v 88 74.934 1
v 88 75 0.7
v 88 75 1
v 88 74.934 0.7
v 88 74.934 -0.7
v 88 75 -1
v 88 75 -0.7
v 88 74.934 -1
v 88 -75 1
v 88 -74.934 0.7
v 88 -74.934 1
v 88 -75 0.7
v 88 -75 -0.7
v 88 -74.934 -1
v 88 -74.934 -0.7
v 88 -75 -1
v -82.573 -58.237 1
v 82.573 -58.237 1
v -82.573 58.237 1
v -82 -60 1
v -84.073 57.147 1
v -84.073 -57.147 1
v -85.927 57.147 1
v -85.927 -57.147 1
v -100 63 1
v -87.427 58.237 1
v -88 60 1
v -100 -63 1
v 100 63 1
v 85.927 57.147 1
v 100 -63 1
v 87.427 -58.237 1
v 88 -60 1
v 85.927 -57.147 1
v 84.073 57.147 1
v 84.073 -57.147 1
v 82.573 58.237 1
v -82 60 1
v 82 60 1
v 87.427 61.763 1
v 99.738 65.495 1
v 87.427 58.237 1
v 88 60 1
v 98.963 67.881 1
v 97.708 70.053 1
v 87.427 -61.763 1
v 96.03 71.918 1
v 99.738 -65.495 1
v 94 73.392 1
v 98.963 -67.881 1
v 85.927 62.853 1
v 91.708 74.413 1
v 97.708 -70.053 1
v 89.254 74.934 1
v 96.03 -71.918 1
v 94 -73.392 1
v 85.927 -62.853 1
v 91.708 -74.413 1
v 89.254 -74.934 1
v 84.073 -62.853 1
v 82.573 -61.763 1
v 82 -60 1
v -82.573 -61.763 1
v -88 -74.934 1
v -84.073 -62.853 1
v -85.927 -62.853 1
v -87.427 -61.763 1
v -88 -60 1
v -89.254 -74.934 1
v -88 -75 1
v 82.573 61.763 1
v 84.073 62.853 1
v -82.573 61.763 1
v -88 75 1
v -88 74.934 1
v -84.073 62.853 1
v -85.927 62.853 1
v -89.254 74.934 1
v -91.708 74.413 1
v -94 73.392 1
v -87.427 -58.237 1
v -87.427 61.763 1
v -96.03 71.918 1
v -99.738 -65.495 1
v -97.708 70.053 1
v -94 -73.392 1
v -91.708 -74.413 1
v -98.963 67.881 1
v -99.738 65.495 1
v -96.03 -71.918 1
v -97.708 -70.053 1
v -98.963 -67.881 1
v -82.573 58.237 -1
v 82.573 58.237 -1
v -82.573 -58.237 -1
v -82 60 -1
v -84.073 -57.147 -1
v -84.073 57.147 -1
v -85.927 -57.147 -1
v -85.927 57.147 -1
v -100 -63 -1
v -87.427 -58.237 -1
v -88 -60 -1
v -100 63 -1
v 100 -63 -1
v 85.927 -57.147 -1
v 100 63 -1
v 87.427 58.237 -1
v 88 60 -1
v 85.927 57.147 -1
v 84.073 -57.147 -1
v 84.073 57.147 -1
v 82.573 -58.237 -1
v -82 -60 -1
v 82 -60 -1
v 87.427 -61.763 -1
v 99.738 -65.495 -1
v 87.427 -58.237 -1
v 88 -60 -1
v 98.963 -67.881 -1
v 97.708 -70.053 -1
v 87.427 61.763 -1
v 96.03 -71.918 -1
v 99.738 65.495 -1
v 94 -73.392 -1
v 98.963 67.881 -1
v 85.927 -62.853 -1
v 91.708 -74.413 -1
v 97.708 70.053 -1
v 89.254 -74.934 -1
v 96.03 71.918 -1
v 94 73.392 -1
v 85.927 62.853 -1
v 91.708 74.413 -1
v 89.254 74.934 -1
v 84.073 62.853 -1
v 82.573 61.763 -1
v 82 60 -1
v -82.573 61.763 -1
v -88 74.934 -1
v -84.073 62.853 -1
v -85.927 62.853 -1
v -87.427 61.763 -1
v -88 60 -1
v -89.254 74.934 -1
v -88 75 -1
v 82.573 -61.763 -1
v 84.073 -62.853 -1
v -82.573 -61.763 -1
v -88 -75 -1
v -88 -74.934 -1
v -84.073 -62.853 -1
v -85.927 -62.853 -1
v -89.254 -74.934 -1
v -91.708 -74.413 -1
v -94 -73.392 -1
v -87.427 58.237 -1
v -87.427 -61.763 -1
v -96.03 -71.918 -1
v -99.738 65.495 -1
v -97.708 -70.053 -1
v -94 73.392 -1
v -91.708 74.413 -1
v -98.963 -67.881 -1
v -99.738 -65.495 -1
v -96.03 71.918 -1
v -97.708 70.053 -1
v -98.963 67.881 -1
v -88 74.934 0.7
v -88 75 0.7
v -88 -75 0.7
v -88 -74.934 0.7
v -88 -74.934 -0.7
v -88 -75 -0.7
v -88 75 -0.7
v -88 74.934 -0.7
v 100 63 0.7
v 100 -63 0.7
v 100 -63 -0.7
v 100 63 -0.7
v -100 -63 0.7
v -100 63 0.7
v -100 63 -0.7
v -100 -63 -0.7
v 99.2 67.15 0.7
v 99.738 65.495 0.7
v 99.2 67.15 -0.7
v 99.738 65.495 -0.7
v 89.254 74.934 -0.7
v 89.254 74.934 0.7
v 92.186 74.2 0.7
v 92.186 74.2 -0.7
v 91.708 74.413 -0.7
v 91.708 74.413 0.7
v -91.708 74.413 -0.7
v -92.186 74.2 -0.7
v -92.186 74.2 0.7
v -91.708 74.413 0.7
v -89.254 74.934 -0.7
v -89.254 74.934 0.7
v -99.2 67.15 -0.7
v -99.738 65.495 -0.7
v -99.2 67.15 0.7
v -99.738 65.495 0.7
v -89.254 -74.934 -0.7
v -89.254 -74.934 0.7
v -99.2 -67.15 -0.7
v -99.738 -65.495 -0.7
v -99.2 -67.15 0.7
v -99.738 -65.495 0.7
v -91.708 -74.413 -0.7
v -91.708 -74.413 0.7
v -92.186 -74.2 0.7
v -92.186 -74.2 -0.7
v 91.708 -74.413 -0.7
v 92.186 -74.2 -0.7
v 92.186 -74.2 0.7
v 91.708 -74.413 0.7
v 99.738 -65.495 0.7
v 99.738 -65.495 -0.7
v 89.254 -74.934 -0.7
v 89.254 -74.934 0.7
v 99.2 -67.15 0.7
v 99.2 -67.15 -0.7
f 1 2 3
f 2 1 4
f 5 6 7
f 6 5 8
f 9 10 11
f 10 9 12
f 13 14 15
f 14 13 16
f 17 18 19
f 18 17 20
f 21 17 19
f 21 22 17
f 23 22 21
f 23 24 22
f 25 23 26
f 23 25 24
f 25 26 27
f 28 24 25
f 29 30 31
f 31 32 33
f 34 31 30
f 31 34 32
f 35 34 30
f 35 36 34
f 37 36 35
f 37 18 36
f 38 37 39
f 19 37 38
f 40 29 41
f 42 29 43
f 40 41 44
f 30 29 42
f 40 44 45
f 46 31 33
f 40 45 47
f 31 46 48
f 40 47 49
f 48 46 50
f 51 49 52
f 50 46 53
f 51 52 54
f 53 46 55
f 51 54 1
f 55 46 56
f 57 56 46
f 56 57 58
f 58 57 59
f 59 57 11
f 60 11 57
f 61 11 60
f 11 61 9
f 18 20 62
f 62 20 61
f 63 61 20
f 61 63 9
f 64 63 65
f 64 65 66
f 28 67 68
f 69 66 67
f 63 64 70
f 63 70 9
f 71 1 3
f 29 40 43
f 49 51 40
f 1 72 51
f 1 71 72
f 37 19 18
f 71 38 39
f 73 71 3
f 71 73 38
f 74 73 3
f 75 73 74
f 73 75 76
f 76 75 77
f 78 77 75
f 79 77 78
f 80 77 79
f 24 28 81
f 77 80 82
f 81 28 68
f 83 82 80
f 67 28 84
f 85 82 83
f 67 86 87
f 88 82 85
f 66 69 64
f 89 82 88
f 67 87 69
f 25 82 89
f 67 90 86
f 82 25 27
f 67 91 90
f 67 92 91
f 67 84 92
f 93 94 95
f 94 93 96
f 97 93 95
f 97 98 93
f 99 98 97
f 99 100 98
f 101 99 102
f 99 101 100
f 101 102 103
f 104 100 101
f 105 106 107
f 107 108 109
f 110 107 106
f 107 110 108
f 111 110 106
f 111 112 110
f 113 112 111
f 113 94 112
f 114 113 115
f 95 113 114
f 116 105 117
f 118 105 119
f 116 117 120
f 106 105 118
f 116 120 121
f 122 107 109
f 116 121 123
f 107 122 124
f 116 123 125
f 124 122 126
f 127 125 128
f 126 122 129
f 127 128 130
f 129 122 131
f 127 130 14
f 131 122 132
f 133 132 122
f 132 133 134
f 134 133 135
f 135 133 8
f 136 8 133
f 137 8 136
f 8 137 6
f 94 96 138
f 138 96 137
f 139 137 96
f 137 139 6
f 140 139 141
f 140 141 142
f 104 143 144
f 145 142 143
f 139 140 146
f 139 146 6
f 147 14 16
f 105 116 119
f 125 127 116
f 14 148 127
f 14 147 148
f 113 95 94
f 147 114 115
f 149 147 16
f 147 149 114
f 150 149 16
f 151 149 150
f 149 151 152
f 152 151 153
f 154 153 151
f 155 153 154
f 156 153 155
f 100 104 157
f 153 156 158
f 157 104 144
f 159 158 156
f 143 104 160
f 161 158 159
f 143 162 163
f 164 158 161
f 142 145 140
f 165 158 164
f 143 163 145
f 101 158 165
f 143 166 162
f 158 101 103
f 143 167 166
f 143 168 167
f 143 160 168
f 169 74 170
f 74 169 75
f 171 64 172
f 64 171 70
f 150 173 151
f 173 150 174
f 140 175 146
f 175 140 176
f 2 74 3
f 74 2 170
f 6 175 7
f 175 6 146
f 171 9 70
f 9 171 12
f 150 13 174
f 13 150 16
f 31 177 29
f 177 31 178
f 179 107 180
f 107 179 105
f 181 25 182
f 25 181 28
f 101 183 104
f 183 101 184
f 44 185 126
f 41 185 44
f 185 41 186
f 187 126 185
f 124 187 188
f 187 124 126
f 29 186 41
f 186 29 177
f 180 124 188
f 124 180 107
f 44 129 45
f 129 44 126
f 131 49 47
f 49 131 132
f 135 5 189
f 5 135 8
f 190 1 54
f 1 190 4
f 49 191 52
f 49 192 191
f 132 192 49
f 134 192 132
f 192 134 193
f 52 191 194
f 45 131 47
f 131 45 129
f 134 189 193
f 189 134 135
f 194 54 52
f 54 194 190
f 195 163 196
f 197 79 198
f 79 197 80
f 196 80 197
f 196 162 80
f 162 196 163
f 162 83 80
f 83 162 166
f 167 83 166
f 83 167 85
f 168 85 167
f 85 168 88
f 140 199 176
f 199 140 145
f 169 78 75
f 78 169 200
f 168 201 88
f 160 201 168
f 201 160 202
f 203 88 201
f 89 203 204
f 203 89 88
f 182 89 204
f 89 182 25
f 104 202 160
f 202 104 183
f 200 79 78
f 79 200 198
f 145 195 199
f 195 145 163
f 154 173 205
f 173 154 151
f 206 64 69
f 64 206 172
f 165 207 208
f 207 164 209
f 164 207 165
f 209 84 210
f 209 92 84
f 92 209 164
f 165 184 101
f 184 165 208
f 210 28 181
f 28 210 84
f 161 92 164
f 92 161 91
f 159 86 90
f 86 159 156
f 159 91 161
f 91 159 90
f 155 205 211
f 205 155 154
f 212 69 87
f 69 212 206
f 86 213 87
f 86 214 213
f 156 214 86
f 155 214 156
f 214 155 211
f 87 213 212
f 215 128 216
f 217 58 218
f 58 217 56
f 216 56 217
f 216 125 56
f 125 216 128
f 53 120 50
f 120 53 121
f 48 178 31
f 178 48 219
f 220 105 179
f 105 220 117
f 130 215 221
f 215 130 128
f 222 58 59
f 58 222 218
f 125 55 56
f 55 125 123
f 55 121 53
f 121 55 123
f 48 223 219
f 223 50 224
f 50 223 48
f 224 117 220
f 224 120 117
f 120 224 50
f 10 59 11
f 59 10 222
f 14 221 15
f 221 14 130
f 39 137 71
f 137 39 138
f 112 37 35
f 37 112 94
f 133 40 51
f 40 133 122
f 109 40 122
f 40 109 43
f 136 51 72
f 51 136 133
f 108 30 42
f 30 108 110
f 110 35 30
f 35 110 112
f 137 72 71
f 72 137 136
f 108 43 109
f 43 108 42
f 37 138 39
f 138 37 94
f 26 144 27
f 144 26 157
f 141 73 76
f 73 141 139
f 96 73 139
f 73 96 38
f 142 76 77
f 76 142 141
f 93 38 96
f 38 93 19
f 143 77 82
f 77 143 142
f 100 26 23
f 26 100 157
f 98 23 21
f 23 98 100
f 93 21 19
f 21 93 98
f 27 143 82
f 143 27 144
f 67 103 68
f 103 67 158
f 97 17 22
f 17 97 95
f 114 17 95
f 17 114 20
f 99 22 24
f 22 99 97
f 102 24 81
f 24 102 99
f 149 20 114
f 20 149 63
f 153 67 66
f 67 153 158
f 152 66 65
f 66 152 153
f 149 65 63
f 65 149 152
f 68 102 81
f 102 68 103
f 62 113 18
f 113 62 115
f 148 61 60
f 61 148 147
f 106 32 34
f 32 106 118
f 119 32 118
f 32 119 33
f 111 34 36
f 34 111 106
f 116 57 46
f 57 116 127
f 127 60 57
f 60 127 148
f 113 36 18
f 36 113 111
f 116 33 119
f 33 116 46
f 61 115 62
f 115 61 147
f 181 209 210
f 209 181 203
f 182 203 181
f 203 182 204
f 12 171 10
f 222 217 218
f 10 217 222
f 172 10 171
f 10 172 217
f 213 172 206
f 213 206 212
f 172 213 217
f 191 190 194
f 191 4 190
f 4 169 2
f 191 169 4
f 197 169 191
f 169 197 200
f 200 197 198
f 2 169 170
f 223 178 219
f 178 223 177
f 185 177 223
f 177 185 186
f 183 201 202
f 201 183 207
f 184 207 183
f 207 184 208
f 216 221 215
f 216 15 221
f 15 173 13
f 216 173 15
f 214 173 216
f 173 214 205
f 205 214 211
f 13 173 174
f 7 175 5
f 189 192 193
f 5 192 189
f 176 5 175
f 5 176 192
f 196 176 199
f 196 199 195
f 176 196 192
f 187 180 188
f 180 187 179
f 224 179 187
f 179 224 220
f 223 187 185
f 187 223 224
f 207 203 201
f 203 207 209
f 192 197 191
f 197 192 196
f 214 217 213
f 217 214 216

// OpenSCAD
// Parameters
sheet_length = 200; //[100:400:1]
sheet_width = 150; //[75:300:1]
sheet_thickness = 2; //[1:6:0.5]
corner_radius = 12; //[6:24:1]
hole_diameter = 6; //[3:12:0.5]
hole_edge_margin = 15; //[8:30:1]
chamfer_size = 0.8; //[0.2:2:0.1]
chamfer_depth = 0.4; //[0.1:1.5:0.1]
eps_overlap = 1; //[0.5:2:0.1]

// Base shapes
module sheet_body_rect() {
  cube([sheet_length - 2*corner_radius, sheet_width, sheet_thickness], center=true);
}

module sheet_body_rect2() {
  cube([sheet_length, sheet_width - 2*corner_radius, sheet_thickness], center=true);
}

module rounded_corner_cyl(pos) {
  translate(pos)
    cylinder(r=corner_radius, h=sheet_thickness, center=true);
}

module mounting_hole(pos) {
  translate(pos)
    cylinder(r=hole_diameter/2, h=sheet_thickness + 2*eps_overlap, center=true);
}

module chamfer_outer_plate() {
  cube([sheet_length + 2*eps_overlap, sheet_width + 2*eps_overlap, chamfer_depth + eps_overlap], center=true);
}

module chamfer_inner_plate() {
  cube([sheet_length - 2*chamfer_size, sheet_width - 2*chamfer_size, chamfer_depth + 2*eps_overlap], center=true);
}

// Operations
module rounded_corners() {
  union() {
    sheet_body_rect();
    sheet_body_rect2();
    rounded_corner_cyl([sheet_length/2 - corner_radius, sheet_width/2 - corner_radius, 0]);
    rounded_corner_cyl([-sheet_length/2 + corner_radius, sheet_width/2 - corner_radius, 0]);
    rounded_corner_cyl([-sheet_length/2 + corner_radius, -sheet_width/2 + corner_radius, 0]);
    rounded_corner_cyl([sheet_length/2 - corner_radius, -sheet_width/2 + corner_radius, 0]);
  }
}

module mounting_holes() {
  union() {
    mounting_hole([sheet_length/2 - hole_edge_margin, sheet_width/2 - hole_edge_margin, 0]);
    mounting_hole([-sheet_length/2 + hole_edge_margin, sheet_width/2 - hole_edge_margin, 0]);
    mounting_hole([-sheet_length/2 + hole_edge_margin, -sheet_width/2 + hole_edge_margin, 0]);
    mounting_hole([sheet_length/2 - hole_edge_margin, -sheet_width/2 + hole_edge_margin, 0]);
  }
}

module chamfer_edges() {
  difference() {
    chamfer_outer_plate();
    chamfer_inner_plate();
  }
}

module sheet_minus_holes() {
  difference() {
    rounded_corners();
    mounting_holes();
  }
}

module sheet_minus_holes_minus_chamfer() {
  difference() {
    sheet_minus_holes();
    chamfer_edges();
  }
}

module final_model() {
  difference() {
    sheet_minus_holes_minus_chamfer();
    // Engraved label is ignored as per rules
  }
}

// Final output
color("Silver") final_model();
